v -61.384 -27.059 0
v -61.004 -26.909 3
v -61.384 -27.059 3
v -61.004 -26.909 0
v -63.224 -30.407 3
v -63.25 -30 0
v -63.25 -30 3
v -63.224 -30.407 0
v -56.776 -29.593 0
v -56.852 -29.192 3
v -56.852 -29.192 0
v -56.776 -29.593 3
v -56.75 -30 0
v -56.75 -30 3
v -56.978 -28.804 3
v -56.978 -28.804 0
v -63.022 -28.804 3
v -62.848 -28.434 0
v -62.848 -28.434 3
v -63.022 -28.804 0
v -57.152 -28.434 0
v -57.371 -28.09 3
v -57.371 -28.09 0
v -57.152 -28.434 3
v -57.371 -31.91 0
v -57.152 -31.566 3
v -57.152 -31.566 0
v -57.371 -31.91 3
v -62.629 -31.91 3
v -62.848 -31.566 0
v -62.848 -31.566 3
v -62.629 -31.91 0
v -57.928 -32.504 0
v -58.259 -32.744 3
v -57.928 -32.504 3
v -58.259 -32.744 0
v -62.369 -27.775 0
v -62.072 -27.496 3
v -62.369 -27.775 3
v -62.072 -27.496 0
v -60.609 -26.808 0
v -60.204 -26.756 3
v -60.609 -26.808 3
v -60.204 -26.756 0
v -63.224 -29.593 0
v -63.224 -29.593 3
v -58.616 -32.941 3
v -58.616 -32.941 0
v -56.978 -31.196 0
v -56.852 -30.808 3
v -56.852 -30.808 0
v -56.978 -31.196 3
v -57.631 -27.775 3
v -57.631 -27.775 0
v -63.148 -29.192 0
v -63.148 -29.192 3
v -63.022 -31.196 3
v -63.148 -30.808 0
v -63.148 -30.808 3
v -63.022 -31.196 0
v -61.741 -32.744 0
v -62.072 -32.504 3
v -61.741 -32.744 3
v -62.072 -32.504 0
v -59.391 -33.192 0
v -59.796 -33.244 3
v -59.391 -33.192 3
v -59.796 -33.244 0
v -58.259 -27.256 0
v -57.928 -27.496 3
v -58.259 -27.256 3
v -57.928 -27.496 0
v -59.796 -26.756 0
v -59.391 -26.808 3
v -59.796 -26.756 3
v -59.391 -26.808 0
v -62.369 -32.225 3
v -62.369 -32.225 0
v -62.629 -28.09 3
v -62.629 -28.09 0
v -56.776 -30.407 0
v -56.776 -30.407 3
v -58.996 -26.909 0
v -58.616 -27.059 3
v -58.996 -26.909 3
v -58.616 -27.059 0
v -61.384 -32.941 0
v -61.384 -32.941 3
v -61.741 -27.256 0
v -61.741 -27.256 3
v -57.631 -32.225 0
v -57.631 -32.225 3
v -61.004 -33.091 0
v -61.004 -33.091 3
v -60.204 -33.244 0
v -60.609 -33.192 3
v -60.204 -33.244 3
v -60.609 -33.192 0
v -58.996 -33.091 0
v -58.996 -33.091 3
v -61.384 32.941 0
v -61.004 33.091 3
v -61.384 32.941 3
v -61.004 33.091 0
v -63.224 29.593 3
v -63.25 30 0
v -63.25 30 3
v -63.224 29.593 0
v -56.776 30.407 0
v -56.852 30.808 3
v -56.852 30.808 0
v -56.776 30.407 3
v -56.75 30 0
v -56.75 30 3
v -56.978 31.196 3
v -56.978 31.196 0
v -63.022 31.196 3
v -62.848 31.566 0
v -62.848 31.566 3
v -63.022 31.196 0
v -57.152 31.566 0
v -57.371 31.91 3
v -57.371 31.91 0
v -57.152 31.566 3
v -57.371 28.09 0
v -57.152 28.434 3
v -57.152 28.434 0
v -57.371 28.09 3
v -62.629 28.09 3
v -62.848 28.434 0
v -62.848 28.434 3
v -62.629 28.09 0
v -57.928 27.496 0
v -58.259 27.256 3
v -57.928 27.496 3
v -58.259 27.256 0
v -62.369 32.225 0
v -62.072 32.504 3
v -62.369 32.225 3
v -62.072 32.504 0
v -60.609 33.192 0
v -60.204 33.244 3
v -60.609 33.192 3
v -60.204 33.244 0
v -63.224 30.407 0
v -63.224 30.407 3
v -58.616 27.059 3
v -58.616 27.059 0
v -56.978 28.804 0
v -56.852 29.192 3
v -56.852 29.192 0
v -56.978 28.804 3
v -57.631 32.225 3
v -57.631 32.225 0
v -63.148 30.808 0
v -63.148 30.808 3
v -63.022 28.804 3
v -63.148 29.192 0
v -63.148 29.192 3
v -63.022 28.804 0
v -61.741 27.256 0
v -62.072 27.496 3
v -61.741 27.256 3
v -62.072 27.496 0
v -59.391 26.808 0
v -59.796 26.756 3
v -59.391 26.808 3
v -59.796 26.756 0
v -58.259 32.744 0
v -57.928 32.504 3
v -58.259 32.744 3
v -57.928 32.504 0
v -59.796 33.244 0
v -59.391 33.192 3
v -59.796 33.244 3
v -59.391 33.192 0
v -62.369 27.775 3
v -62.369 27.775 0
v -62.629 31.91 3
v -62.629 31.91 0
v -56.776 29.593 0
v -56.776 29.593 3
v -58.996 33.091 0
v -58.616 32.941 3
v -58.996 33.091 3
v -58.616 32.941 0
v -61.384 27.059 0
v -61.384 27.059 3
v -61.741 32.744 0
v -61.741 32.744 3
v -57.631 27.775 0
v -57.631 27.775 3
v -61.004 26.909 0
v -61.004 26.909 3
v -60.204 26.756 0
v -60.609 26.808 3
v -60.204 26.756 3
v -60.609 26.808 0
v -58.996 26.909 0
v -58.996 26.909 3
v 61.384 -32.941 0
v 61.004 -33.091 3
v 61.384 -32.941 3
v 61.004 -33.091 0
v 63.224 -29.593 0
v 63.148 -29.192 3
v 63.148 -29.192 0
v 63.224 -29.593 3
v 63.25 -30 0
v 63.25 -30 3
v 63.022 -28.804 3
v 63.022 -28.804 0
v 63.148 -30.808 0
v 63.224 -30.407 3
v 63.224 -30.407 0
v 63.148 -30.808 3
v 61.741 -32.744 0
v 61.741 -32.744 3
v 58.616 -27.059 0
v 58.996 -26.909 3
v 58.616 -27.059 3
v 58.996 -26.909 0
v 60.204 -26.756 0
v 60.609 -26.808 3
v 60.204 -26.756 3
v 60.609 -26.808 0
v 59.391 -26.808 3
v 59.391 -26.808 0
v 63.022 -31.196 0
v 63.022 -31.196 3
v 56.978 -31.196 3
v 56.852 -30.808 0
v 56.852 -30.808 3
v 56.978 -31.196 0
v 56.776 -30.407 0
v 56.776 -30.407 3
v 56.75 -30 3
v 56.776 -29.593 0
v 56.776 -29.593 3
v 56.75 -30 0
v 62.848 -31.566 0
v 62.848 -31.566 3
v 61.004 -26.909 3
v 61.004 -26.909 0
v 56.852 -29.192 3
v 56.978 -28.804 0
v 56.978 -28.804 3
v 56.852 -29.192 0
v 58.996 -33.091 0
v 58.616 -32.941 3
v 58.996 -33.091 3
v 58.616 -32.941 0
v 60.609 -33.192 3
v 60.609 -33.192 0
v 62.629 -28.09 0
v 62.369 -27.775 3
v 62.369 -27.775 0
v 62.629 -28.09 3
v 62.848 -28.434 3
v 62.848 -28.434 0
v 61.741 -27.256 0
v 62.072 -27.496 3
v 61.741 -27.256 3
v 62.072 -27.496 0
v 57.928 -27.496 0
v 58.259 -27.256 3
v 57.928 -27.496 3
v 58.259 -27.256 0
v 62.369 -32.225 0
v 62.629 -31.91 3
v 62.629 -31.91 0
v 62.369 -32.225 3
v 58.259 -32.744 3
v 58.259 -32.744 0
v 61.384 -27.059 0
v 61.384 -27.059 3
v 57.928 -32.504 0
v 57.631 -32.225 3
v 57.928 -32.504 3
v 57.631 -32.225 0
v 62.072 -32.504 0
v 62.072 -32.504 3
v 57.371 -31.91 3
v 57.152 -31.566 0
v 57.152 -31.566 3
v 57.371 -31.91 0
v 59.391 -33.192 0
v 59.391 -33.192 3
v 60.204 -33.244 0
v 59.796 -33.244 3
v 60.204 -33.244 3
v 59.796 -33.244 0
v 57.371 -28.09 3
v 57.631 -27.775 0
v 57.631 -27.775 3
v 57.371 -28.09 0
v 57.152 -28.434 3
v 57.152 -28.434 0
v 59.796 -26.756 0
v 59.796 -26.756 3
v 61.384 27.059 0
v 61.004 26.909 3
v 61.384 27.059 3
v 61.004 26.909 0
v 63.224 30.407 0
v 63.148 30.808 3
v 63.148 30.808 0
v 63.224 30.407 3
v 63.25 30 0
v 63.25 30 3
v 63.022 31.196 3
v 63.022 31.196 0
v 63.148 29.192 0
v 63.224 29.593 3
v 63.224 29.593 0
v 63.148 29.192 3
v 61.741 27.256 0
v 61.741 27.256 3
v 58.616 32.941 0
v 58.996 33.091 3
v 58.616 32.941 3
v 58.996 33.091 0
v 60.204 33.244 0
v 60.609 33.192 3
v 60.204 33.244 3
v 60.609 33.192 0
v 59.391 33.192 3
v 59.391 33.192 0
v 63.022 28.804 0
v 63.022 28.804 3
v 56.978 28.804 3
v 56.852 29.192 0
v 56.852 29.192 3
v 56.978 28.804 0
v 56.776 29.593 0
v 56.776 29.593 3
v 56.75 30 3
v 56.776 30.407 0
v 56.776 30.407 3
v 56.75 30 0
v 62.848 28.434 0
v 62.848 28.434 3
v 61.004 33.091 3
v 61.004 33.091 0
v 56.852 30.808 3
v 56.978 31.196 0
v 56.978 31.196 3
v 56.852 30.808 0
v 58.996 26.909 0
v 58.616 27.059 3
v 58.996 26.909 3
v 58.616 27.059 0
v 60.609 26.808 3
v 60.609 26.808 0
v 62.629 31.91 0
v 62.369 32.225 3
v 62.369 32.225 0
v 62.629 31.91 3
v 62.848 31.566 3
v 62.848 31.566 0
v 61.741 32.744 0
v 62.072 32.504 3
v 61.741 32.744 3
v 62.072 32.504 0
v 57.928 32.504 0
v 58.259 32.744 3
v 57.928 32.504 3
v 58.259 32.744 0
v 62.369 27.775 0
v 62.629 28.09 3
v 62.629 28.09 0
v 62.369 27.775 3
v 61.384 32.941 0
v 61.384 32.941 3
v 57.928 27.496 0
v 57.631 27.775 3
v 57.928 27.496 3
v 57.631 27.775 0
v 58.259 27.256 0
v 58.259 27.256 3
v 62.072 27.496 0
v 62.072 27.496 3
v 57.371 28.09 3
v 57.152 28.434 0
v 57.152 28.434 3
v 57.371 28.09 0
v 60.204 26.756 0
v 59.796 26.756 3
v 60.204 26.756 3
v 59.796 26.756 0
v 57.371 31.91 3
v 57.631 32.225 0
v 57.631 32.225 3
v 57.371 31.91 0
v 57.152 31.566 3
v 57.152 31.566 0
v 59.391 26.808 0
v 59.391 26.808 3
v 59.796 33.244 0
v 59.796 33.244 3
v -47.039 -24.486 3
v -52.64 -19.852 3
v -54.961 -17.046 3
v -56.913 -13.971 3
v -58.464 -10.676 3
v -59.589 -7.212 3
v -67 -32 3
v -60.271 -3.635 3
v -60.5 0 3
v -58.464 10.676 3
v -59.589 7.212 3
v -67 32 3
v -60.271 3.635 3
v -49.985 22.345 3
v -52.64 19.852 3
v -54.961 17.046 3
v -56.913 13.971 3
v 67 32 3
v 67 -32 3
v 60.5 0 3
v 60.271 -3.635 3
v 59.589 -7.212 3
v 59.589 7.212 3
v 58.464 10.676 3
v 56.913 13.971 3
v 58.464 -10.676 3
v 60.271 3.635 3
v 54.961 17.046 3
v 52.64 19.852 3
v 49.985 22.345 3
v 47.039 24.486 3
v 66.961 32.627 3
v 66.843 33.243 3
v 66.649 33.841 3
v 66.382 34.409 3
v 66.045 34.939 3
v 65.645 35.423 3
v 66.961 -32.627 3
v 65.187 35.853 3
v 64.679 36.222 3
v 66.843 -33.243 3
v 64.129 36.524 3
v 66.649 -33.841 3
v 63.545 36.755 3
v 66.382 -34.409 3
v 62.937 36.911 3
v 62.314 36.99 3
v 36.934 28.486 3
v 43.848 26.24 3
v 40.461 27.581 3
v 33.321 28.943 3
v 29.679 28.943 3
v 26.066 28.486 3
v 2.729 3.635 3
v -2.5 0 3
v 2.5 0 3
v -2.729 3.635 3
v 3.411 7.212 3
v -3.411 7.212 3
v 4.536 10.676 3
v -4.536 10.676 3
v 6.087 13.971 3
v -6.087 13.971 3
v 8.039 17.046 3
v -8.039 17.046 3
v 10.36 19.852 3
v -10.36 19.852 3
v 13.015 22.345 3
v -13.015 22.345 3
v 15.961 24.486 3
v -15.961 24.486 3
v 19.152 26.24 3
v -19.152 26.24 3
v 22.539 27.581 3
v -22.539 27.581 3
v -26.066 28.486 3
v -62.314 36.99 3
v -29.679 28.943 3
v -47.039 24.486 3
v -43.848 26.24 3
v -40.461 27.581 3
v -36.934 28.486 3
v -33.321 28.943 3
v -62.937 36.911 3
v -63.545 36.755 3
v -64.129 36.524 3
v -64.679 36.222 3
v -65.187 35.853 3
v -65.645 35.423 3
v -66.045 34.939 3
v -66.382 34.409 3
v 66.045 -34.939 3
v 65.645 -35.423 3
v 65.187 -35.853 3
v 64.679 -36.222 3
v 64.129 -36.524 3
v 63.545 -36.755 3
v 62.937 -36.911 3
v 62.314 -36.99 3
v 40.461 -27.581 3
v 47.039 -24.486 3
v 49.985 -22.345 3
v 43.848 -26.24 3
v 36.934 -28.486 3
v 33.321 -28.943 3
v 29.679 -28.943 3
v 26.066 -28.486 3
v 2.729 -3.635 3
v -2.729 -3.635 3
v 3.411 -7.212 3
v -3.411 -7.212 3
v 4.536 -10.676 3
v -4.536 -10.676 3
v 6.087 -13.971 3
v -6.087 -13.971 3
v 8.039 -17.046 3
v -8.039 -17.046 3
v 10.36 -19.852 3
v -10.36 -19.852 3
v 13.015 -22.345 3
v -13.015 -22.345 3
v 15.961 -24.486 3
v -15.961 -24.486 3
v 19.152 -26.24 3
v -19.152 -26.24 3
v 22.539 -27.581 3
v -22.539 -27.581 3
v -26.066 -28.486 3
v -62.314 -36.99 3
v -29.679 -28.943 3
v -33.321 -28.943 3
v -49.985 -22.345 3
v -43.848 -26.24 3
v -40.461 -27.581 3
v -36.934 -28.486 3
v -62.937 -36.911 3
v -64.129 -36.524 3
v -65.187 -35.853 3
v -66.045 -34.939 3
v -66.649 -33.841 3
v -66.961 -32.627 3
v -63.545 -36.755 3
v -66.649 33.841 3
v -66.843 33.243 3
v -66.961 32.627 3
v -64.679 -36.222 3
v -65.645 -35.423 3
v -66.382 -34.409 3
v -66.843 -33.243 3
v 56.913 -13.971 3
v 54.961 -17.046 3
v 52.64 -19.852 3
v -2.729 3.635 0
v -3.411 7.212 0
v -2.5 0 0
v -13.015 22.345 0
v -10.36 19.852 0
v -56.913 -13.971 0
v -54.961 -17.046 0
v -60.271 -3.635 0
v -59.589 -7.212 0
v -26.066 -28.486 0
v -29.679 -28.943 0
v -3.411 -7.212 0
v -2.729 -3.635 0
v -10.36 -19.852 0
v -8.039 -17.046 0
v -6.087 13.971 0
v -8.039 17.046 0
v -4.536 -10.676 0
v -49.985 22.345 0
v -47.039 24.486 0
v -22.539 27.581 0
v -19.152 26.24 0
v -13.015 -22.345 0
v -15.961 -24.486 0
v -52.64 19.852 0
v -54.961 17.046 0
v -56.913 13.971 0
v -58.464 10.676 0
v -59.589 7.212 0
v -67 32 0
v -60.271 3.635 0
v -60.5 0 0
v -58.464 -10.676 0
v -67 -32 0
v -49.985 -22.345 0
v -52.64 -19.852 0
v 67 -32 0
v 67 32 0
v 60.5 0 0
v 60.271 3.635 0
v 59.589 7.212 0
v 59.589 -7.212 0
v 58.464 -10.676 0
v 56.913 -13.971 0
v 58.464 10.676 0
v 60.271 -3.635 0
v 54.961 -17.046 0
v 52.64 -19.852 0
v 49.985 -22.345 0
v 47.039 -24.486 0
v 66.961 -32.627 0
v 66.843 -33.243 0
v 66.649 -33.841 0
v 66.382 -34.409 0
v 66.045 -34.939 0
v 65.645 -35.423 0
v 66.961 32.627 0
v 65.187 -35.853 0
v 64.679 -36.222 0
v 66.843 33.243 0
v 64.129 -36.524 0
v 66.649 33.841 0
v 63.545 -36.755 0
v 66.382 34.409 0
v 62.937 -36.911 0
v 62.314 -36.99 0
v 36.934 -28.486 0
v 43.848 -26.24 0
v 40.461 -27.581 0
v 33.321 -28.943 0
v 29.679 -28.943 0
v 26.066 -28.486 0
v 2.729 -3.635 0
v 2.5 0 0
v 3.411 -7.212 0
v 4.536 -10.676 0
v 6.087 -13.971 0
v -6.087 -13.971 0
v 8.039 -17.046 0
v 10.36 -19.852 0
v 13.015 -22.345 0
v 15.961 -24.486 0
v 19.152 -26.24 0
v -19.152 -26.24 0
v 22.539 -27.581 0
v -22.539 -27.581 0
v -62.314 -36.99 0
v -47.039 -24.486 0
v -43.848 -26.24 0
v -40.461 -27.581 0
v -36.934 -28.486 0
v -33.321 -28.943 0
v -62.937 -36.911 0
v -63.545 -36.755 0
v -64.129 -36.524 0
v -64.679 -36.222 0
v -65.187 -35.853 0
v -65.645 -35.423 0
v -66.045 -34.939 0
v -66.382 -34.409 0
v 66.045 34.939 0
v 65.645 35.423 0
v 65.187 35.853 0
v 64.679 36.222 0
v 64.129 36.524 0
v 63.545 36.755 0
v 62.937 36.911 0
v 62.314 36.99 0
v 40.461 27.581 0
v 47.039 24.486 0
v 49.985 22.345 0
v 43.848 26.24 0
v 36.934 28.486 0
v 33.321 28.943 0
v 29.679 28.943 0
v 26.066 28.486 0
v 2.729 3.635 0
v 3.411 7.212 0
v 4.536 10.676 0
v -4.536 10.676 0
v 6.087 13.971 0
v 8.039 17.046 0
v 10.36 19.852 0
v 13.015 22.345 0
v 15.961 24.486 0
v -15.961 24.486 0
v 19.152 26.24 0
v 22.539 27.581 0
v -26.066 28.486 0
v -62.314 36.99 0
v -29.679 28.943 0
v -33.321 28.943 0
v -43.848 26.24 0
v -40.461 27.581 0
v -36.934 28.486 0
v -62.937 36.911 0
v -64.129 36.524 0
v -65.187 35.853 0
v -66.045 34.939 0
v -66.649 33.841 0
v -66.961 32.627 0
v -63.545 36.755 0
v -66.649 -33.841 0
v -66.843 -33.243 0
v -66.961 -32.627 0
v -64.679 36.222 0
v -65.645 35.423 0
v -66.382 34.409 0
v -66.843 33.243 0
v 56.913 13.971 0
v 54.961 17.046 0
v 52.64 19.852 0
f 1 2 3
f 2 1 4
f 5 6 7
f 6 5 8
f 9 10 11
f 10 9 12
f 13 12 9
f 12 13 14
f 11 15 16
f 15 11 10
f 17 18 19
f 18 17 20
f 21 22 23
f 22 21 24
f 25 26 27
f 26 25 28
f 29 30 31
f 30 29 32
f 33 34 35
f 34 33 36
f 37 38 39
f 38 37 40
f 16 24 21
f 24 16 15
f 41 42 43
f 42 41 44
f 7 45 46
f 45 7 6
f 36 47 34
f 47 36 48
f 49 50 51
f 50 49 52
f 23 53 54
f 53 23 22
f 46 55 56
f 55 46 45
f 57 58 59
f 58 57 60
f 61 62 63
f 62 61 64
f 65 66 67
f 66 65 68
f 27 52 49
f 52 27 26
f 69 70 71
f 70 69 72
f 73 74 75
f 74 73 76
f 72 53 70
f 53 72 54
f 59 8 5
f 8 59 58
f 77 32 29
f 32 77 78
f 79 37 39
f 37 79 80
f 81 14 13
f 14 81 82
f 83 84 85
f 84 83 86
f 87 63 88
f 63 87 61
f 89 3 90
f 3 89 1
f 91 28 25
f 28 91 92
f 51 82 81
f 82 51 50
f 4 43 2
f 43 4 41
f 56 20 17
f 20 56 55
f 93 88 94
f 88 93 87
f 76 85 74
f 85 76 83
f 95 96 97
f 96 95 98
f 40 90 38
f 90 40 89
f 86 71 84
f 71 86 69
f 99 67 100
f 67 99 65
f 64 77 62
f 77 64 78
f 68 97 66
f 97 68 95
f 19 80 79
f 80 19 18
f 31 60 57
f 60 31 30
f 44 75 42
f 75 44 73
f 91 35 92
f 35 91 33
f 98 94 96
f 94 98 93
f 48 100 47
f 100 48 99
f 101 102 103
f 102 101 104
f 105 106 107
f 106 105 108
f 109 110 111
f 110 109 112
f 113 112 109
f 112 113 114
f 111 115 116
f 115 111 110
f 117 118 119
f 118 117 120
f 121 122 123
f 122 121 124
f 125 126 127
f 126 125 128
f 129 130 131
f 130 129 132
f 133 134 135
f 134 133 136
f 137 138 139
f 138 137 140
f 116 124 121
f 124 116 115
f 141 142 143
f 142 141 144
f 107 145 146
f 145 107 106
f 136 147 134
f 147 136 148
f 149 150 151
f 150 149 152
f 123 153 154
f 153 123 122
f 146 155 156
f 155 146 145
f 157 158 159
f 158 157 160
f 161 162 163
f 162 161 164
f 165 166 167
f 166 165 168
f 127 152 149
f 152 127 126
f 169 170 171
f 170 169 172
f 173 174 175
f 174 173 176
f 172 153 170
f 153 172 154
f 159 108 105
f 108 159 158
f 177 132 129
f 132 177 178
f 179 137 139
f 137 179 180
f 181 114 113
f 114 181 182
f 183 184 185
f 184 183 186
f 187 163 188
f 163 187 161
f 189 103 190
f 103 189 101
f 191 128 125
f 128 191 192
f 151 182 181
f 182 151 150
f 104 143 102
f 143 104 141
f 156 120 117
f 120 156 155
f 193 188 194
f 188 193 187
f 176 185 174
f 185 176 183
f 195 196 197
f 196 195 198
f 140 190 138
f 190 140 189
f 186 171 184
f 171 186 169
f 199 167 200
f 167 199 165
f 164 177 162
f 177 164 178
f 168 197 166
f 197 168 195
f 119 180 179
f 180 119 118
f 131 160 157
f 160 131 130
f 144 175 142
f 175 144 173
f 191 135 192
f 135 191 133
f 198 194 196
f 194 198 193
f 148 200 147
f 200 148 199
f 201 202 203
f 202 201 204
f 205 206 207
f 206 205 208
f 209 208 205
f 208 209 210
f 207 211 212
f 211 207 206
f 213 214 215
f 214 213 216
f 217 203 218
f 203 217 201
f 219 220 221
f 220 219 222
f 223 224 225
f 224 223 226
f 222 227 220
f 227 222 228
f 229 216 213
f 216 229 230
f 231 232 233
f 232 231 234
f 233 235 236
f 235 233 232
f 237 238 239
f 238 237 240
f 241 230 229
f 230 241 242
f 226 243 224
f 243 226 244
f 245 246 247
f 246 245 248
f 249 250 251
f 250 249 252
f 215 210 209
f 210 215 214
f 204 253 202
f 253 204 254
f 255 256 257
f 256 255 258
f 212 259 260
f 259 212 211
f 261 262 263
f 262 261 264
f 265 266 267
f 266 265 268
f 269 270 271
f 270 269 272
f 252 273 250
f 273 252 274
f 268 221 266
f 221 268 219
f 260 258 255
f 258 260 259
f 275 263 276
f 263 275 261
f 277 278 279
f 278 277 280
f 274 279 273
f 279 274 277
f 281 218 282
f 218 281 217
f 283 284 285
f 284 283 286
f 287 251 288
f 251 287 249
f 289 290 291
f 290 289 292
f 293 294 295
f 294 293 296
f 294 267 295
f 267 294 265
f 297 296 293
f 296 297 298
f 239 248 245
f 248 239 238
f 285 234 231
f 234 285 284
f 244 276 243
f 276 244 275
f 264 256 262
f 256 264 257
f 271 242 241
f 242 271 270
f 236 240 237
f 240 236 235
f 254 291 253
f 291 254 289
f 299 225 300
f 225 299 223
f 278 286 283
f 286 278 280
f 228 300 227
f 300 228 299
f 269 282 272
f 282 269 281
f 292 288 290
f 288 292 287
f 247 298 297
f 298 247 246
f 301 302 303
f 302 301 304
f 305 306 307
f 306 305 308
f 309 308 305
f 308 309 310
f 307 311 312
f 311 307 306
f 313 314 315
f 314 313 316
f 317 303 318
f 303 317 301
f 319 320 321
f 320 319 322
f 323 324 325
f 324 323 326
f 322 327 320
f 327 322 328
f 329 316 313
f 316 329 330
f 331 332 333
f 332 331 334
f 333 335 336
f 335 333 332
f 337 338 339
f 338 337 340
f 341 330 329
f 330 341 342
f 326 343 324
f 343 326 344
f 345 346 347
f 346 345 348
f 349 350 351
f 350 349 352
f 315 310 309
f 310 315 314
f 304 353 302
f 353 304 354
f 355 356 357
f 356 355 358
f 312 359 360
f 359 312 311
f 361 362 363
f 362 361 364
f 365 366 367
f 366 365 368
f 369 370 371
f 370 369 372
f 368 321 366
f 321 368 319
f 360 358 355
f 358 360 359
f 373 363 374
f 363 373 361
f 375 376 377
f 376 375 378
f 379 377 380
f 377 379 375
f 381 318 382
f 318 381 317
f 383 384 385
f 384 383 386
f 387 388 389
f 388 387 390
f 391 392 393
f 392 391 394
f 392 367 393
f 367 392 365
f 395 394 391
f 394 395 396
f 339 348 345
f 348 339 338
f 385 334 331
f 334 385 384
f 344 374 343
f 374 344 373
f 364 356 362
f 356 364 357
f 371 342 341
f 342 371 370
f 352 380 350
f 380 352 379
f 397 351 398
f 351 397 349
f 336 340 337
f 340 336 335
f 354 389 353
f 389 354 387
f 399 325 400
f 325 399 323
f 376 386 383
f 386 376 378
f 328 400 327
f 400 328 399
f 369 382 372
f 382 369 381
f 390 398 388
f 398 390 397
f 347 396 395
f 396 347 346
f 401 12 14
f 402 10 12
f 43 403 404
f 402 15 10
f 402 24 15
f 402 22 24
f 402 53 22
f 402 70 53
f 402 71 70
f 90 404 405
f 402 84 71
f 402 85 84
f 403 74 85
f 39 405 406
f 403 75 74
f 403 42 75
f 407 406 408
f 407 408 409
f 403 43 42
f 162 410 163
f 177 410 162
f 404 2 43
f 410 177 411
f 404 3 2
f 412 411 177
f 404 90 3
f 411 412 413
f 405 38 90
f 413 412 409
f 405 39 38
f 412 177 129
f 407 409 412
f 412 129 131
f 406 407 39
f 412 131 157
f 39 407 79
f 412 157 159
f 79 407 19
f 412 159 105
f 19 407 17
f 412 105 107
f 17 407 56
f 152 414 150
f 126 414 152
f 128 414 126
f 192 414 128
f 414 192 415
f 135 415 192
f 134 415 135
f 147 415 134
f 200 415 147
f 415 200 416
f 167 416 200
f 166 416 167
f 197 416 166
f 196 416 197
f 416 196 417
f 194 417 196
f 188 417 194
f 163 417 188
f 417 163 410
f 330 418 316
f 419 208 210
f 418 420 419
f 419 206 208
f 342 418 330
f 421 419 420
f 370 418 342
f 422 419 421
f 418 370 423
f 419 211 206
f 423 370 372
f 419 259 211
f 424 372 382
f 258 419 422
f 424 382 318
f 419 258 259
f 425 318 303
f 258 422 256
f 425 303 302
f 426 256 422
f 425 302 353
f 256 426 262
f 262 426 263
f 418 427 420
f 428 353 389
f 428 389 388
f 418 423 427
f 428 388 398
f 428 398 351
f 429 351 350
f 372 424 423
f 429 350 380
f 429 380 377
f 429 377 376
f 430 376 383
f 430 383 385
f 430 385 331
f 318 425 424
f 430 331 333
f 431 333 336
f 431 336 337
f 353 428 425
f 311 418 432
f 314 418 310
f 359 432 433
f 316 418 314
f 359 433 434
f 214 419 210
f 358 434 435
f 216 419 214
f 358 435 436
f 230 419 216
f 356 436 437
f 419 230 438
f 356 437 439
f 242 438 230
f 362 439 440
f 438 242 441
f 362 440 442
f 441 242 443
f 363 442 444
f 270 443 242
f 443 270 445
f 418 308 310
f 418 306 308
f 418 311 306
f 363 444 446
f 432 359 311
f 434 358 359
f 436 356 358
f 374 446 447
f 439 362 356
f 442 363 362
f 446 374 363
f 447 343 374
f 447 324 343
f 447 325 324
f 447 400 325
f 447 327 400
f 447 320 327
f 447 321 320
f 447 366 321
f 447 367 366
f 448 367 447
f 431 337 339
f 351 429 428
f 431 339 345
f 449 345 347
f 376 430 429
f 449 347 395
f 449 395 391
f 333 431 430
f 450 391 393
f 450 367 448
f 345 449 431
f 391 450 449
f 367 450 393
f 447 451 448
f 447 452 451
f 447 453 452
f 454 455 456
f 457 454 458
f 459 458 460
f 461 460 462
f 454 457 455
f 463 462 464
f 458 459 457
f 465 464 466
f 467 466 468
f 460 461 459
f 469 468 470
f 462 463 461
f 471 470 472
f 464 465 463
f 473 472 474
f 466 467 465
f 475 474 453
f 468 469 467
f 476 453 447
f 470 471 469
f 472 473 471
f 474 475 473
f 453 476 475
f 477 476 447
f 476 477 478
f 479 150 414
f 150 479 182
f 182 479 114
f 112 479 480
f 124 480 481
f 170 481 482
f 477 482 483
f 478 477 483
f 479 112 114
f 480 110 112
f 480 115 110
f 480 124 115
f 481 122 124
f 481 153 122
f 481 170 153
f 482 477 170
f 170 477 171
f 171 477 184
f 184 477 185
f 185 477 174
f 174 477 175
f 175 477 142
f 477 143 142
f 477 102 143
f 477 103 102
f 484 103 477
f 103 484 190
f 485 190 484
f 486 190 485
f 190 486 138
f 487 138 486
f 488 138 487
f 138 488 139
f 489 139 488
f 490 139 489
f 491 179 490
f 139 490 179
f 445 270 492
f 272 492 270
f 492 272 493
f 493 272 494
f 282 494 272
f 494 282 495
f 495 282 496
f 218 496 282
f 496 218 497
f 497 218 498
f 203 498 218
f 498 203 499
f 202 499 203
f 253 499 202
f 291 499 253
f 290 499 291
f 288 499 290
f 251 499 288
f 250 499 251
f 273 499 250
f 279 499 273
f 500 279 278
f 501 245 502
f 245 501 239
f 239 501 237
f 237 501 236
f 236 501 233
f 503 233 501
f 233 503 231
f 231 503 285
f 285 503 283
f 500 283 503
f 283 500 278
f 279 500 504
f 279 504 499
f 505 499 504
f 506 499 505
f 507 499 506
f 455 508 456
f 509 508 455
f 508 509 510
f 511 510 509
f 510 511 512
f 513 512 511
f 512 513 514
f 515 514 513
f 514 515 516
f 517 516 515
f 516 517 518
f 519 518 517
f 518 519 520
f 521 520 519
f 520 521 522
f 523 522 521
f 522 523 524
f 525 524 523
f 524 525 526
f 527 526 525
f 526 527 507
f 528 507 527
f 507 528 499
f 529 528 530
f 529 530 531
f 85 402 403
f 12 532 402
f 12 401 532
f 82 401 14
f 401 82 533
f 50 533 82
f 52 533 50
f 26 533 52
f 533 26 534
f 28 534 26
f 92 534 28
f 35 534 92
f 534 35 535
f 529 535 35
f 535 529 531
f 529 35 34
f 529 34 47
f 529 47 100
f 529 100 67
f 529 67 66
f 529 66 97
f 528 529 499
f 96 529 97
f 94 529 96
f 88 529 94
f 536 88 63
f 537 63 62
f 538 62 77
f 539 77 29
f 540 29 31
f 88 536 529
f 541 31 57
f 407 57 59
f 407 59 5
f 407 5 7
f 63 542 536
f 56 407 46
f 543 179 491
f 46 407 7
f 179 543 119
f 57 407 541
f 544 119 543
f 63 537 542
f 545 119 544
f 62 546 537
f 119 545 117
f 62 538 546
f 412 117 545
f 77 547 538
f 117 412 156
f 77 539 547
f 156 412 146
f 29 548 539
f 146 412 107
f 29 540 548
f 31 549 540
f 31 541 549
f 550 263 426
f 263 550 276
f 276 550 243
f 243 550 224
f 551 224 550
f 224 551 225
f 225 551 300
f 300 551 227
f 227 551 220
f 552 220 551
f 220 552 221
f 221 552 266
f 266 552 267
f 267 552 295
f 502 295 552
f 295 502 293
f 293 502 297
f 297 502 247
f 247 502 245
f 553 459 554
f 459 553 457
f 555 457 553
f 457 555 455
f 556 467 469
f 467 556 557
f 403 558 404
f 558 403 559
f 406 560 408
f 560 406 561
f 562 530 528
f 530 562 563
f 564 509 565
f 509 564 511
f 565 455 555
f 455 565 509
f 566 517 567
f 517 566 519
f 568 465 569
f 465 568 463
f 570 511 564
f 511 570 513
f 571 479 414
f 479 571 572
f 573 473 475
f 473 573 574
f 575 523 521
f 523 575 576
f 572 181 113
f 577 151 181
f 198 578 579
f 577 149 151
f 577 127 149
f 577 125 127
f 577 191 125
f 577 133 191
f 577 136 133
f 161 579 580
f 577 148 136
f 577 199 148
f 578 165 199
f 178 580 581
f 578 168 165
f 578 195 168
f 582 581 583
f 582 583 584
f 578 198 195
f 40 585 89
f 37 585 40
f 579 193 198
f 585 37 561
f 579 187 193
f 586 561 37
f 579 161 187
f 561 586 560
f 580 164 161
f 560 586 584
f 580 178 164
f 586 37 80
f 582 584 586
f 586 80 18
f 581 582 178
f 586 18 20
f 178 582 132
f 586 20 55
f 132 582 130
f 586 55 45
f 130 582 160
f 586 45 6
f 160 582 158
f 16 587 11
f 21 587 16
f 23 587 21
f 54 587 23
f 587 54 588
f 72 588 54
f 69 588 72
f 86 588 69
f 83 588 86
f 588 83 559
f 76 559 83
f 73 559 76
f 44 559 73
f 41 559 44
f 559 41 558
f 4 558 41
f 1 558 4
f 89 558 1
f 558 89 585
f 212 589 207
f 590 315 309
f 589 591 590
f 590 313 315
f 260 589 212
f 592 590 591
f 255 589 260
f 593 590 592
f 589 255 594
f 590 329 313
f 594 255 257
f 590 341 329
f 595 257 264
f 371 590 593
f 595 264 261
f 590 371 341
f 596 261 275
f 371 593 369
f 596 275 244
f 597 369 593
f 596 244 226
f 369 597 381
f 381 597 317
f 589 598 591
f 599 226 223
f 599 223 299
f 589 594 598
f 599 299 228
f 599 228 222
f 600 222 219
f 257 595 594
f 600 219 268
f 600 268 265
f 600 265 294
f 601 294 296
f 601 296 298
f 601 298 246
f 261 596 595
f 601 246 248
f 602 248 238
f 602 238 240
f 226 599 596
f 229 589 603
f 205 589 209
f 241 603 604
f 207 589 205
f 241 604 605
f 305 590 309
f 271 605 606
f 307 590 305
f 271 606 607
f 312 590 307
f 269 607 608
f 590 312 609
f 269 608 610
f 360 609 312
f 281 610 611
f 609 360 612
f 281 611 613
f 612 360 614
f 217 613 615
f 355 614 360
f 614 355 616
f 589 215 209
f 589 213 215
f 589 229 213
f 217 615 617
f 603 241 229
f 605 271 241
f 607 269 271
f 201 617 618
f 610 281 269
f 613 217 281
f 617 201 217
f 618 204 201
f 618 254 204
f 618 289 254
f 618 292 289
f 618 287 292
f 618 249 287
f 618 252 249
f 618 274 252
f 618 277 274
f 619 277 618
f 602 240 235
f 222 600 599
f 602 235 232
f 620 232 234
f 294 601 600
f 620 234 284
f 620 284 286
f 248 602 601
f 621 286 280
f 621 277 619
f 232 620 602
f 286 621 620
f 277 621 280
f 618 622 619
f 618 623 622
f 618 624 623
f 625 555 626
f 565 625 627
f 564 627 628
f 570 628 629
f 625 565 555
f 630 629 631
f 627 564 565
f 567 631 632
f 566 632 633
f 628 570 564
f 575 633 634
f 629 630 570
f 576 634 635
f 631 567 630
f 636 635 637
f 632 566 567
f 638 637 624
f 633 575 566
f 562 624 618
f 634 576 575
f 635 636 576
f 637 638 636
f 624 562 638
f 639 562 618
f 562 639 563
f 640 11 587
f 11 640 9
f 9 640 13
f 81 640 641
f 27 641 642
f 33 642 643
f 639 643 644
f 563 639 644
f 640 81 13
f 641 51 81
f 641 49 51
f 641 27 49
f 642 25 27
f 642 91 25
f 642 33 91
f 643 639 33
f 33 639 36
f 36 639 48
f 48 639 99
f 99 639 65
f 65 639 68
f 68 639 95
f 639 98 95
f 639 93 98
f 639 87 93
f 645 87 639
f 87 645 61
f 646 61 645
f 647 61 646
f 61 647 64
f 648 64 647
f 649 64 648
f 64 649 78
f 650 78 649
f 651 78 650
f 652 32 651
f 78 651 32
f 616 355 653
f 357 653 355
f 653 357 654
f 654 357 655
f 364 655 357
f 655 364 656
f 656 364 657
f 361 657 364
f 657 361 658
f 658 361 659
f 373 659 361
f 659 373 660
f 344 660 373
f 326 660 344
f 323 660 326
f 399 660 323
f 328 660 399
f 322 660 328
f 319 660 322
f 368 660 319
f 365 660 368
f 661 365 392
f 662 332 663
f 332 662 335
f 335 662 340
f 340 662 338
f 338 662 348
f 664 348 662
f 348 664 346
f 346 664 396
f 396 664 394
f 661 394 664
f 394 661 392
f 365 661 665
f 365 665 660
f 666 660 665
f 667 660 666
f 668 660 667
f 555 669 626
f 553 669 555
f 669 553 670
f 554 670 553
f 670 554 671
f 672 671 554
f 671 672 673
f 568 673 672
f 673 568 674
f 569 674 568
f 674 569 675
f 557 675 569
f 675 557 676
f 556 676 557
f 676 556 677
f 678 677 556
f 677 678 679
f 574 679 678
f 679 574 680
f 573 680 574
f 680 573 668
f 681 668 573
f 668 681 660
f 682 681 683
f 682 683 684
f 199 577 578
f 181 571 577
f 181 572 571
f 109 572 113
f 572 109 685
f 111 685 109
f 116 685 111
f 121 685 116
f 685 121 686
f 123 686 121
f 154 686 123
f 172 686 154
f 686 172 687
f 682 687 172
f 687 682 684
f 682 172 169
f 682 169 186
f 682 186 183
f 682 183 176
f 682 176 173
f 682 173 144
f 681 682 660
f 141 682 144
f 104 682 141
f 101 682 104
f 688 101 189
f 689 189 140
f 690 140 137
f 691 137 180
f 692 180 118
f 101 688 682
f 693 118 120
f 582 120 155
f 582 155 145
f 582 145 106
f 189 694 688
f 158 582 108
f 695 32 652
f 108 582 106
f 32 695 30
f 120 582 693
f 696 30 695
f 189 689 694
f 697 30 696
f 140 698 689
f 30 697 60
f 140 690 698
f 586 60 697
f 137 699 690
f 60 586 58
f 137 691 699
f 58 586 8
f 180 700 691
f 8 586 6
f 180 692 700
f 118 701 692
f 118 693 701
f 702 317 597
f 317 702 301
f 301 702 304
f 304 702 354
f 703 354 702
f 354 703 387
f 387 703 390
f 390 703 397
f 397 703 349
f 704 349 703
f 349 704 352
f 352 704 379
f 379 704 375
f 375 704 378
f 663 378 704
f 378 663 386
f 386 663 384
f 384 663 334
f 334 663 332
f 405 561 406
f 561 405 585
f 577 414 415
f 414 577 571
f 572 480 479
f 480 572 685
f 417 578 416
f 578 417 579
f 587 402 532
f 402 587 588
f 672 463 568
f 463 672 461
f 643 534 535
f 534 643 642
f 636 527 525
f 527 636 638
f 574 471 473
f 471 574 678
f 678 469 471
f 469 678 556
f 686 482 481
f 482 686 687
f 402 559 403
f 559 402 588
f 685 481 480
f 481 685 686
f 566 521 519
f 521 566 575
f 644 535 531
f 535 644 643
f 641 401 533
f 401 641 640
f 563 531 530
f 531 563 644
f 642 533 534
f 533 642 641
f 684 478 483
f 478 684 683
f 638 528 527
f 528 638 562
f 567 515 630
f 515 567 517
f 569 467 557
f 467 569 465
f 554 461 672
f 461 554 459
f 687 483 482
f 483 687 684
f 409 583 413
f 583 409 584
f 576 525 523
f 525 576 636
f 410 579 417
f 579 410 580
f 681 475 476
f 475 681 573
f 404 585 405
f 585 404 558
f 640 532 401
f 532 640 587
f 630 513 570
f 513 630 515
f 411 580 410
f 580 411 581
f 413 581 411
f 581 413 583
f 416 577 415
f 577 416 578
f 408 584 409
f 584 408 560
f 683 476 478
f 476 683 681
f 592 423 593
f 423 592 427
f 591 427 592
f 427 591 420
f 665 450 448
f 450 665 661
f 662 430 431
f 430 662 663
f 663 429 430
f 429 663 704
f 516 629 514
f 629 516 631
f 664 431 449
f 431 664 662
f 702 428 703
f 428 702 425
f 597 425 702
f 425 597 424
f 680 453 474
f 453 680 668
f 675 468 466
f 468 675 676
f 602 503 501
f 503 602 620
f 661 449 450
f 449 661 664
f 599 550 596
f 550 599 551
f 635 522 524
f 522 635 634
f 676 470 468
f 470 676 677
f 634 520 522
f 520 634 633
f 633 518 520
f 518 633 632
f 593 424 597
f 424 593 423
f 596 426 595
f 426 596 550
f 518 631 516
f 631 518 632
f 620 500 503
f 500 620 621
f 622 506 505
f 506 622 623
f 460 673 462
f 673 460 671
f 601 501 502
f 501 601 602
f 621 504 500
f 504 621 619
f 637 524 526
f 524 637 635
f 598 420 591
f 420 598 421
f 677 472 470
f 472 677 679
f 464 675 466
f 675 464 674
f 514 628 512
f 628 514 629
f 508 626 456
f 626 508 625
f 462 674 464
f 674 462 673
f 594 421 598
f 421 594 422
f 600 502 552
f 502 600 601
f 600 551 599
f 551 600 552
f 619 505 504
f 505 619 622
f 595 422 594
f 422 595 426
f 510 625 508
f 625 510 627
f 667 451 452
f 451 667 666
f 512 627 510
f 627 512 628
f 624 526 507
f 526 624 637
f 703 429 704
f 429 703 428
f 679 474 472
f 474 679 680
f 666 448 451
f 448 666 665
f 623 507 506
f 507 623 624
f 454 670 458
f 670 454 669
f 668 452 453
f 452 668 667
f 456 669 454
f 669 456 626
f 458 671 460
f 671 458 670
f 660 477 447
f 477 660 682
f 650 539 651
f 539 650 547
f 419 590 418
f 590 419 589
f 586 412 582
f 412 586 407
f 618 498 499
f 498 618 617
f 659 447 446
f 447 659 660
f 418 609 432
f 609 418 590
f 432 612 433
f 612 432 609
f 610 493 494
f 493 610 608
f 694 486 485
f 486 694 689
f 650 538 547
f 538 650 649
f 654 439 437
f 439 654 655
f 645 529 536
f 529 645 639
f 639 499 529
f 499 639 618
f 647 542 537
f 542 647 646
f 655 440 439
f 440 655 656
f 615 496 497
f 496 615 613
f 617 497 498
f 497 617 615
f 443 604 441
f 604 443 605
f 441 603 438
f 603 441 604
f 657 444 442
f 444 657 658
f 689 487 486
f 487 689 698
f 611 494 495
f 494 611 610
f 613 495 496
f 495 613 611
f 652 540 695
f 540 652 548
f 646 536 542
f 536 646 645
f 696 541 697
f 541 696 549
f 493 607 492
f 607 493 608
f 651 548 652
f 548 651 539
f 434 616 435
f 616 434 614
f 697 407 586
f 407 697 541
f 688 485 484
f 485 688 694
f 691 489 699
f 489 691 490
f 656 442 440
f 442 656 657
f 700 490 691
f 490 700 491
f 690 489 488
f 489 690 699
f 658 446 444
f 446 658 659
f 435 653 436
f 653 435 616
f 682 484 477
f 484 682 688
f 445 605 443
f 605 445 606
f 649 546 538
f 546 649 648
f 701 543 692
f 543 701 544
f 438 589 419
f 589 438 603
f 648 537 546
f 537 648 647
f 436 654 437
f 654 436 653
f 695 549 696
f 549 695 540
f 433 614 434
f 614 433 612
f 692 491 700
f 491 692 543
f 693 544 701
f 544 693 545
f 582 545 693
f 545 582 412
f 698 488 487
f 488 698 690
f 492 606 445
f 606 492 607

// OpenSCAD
$fn = 50;


difference() {
	union() {
		hull() {
			translate(v = [-62.0000000000, 32.0000000000, 0]) {
				cylinder(h = 3, r = 5);
			}
			translate(v = [62.0000000000, 32.0000000000, 0]) {
				cylinder(h = 3, r = 5);
			}
			translate(v = [-62.0000000000, -32.0000000000, 0]) {
				cylinder(h = 3, r = 5);
			}
			translate(v = [62.0000000000, -32.0000000000, 0]) {
				cylinder(h = 3, r = 5);
			}
		}
	}
	union() {
		#translate(v = [-60.0000000000, -30.0000000000, -100.0000000000]) {
			cylinder(h = 200, r = 3.2500000000);
		}
		#translate(v = [-60.0000000000, 30.0000000000, -100.0000000000]) {
			cylinder(h = 200, r = 3.2500000000);
		}
		#translate(v = [60.0000000000, -30.0000000000, -100.0000000000]) {
			cylinder(h = 200, r = 3.2500000000);
		}
		#translate(v = [60.0000000000, 30.0000000000, -100.0000000000]) {
			cylinder(h = 200, r = 3.2500000000);
		}
		#translate(v = [-31.5000000000, 0, 0]) {
			cylinder(h = 3, r = 29.0000000000);
		}
		#translate(v = [31.5000000000, 0, 0]) {
			cylinder(h = 3, r = 29.0000000000);
		}
	}
}
